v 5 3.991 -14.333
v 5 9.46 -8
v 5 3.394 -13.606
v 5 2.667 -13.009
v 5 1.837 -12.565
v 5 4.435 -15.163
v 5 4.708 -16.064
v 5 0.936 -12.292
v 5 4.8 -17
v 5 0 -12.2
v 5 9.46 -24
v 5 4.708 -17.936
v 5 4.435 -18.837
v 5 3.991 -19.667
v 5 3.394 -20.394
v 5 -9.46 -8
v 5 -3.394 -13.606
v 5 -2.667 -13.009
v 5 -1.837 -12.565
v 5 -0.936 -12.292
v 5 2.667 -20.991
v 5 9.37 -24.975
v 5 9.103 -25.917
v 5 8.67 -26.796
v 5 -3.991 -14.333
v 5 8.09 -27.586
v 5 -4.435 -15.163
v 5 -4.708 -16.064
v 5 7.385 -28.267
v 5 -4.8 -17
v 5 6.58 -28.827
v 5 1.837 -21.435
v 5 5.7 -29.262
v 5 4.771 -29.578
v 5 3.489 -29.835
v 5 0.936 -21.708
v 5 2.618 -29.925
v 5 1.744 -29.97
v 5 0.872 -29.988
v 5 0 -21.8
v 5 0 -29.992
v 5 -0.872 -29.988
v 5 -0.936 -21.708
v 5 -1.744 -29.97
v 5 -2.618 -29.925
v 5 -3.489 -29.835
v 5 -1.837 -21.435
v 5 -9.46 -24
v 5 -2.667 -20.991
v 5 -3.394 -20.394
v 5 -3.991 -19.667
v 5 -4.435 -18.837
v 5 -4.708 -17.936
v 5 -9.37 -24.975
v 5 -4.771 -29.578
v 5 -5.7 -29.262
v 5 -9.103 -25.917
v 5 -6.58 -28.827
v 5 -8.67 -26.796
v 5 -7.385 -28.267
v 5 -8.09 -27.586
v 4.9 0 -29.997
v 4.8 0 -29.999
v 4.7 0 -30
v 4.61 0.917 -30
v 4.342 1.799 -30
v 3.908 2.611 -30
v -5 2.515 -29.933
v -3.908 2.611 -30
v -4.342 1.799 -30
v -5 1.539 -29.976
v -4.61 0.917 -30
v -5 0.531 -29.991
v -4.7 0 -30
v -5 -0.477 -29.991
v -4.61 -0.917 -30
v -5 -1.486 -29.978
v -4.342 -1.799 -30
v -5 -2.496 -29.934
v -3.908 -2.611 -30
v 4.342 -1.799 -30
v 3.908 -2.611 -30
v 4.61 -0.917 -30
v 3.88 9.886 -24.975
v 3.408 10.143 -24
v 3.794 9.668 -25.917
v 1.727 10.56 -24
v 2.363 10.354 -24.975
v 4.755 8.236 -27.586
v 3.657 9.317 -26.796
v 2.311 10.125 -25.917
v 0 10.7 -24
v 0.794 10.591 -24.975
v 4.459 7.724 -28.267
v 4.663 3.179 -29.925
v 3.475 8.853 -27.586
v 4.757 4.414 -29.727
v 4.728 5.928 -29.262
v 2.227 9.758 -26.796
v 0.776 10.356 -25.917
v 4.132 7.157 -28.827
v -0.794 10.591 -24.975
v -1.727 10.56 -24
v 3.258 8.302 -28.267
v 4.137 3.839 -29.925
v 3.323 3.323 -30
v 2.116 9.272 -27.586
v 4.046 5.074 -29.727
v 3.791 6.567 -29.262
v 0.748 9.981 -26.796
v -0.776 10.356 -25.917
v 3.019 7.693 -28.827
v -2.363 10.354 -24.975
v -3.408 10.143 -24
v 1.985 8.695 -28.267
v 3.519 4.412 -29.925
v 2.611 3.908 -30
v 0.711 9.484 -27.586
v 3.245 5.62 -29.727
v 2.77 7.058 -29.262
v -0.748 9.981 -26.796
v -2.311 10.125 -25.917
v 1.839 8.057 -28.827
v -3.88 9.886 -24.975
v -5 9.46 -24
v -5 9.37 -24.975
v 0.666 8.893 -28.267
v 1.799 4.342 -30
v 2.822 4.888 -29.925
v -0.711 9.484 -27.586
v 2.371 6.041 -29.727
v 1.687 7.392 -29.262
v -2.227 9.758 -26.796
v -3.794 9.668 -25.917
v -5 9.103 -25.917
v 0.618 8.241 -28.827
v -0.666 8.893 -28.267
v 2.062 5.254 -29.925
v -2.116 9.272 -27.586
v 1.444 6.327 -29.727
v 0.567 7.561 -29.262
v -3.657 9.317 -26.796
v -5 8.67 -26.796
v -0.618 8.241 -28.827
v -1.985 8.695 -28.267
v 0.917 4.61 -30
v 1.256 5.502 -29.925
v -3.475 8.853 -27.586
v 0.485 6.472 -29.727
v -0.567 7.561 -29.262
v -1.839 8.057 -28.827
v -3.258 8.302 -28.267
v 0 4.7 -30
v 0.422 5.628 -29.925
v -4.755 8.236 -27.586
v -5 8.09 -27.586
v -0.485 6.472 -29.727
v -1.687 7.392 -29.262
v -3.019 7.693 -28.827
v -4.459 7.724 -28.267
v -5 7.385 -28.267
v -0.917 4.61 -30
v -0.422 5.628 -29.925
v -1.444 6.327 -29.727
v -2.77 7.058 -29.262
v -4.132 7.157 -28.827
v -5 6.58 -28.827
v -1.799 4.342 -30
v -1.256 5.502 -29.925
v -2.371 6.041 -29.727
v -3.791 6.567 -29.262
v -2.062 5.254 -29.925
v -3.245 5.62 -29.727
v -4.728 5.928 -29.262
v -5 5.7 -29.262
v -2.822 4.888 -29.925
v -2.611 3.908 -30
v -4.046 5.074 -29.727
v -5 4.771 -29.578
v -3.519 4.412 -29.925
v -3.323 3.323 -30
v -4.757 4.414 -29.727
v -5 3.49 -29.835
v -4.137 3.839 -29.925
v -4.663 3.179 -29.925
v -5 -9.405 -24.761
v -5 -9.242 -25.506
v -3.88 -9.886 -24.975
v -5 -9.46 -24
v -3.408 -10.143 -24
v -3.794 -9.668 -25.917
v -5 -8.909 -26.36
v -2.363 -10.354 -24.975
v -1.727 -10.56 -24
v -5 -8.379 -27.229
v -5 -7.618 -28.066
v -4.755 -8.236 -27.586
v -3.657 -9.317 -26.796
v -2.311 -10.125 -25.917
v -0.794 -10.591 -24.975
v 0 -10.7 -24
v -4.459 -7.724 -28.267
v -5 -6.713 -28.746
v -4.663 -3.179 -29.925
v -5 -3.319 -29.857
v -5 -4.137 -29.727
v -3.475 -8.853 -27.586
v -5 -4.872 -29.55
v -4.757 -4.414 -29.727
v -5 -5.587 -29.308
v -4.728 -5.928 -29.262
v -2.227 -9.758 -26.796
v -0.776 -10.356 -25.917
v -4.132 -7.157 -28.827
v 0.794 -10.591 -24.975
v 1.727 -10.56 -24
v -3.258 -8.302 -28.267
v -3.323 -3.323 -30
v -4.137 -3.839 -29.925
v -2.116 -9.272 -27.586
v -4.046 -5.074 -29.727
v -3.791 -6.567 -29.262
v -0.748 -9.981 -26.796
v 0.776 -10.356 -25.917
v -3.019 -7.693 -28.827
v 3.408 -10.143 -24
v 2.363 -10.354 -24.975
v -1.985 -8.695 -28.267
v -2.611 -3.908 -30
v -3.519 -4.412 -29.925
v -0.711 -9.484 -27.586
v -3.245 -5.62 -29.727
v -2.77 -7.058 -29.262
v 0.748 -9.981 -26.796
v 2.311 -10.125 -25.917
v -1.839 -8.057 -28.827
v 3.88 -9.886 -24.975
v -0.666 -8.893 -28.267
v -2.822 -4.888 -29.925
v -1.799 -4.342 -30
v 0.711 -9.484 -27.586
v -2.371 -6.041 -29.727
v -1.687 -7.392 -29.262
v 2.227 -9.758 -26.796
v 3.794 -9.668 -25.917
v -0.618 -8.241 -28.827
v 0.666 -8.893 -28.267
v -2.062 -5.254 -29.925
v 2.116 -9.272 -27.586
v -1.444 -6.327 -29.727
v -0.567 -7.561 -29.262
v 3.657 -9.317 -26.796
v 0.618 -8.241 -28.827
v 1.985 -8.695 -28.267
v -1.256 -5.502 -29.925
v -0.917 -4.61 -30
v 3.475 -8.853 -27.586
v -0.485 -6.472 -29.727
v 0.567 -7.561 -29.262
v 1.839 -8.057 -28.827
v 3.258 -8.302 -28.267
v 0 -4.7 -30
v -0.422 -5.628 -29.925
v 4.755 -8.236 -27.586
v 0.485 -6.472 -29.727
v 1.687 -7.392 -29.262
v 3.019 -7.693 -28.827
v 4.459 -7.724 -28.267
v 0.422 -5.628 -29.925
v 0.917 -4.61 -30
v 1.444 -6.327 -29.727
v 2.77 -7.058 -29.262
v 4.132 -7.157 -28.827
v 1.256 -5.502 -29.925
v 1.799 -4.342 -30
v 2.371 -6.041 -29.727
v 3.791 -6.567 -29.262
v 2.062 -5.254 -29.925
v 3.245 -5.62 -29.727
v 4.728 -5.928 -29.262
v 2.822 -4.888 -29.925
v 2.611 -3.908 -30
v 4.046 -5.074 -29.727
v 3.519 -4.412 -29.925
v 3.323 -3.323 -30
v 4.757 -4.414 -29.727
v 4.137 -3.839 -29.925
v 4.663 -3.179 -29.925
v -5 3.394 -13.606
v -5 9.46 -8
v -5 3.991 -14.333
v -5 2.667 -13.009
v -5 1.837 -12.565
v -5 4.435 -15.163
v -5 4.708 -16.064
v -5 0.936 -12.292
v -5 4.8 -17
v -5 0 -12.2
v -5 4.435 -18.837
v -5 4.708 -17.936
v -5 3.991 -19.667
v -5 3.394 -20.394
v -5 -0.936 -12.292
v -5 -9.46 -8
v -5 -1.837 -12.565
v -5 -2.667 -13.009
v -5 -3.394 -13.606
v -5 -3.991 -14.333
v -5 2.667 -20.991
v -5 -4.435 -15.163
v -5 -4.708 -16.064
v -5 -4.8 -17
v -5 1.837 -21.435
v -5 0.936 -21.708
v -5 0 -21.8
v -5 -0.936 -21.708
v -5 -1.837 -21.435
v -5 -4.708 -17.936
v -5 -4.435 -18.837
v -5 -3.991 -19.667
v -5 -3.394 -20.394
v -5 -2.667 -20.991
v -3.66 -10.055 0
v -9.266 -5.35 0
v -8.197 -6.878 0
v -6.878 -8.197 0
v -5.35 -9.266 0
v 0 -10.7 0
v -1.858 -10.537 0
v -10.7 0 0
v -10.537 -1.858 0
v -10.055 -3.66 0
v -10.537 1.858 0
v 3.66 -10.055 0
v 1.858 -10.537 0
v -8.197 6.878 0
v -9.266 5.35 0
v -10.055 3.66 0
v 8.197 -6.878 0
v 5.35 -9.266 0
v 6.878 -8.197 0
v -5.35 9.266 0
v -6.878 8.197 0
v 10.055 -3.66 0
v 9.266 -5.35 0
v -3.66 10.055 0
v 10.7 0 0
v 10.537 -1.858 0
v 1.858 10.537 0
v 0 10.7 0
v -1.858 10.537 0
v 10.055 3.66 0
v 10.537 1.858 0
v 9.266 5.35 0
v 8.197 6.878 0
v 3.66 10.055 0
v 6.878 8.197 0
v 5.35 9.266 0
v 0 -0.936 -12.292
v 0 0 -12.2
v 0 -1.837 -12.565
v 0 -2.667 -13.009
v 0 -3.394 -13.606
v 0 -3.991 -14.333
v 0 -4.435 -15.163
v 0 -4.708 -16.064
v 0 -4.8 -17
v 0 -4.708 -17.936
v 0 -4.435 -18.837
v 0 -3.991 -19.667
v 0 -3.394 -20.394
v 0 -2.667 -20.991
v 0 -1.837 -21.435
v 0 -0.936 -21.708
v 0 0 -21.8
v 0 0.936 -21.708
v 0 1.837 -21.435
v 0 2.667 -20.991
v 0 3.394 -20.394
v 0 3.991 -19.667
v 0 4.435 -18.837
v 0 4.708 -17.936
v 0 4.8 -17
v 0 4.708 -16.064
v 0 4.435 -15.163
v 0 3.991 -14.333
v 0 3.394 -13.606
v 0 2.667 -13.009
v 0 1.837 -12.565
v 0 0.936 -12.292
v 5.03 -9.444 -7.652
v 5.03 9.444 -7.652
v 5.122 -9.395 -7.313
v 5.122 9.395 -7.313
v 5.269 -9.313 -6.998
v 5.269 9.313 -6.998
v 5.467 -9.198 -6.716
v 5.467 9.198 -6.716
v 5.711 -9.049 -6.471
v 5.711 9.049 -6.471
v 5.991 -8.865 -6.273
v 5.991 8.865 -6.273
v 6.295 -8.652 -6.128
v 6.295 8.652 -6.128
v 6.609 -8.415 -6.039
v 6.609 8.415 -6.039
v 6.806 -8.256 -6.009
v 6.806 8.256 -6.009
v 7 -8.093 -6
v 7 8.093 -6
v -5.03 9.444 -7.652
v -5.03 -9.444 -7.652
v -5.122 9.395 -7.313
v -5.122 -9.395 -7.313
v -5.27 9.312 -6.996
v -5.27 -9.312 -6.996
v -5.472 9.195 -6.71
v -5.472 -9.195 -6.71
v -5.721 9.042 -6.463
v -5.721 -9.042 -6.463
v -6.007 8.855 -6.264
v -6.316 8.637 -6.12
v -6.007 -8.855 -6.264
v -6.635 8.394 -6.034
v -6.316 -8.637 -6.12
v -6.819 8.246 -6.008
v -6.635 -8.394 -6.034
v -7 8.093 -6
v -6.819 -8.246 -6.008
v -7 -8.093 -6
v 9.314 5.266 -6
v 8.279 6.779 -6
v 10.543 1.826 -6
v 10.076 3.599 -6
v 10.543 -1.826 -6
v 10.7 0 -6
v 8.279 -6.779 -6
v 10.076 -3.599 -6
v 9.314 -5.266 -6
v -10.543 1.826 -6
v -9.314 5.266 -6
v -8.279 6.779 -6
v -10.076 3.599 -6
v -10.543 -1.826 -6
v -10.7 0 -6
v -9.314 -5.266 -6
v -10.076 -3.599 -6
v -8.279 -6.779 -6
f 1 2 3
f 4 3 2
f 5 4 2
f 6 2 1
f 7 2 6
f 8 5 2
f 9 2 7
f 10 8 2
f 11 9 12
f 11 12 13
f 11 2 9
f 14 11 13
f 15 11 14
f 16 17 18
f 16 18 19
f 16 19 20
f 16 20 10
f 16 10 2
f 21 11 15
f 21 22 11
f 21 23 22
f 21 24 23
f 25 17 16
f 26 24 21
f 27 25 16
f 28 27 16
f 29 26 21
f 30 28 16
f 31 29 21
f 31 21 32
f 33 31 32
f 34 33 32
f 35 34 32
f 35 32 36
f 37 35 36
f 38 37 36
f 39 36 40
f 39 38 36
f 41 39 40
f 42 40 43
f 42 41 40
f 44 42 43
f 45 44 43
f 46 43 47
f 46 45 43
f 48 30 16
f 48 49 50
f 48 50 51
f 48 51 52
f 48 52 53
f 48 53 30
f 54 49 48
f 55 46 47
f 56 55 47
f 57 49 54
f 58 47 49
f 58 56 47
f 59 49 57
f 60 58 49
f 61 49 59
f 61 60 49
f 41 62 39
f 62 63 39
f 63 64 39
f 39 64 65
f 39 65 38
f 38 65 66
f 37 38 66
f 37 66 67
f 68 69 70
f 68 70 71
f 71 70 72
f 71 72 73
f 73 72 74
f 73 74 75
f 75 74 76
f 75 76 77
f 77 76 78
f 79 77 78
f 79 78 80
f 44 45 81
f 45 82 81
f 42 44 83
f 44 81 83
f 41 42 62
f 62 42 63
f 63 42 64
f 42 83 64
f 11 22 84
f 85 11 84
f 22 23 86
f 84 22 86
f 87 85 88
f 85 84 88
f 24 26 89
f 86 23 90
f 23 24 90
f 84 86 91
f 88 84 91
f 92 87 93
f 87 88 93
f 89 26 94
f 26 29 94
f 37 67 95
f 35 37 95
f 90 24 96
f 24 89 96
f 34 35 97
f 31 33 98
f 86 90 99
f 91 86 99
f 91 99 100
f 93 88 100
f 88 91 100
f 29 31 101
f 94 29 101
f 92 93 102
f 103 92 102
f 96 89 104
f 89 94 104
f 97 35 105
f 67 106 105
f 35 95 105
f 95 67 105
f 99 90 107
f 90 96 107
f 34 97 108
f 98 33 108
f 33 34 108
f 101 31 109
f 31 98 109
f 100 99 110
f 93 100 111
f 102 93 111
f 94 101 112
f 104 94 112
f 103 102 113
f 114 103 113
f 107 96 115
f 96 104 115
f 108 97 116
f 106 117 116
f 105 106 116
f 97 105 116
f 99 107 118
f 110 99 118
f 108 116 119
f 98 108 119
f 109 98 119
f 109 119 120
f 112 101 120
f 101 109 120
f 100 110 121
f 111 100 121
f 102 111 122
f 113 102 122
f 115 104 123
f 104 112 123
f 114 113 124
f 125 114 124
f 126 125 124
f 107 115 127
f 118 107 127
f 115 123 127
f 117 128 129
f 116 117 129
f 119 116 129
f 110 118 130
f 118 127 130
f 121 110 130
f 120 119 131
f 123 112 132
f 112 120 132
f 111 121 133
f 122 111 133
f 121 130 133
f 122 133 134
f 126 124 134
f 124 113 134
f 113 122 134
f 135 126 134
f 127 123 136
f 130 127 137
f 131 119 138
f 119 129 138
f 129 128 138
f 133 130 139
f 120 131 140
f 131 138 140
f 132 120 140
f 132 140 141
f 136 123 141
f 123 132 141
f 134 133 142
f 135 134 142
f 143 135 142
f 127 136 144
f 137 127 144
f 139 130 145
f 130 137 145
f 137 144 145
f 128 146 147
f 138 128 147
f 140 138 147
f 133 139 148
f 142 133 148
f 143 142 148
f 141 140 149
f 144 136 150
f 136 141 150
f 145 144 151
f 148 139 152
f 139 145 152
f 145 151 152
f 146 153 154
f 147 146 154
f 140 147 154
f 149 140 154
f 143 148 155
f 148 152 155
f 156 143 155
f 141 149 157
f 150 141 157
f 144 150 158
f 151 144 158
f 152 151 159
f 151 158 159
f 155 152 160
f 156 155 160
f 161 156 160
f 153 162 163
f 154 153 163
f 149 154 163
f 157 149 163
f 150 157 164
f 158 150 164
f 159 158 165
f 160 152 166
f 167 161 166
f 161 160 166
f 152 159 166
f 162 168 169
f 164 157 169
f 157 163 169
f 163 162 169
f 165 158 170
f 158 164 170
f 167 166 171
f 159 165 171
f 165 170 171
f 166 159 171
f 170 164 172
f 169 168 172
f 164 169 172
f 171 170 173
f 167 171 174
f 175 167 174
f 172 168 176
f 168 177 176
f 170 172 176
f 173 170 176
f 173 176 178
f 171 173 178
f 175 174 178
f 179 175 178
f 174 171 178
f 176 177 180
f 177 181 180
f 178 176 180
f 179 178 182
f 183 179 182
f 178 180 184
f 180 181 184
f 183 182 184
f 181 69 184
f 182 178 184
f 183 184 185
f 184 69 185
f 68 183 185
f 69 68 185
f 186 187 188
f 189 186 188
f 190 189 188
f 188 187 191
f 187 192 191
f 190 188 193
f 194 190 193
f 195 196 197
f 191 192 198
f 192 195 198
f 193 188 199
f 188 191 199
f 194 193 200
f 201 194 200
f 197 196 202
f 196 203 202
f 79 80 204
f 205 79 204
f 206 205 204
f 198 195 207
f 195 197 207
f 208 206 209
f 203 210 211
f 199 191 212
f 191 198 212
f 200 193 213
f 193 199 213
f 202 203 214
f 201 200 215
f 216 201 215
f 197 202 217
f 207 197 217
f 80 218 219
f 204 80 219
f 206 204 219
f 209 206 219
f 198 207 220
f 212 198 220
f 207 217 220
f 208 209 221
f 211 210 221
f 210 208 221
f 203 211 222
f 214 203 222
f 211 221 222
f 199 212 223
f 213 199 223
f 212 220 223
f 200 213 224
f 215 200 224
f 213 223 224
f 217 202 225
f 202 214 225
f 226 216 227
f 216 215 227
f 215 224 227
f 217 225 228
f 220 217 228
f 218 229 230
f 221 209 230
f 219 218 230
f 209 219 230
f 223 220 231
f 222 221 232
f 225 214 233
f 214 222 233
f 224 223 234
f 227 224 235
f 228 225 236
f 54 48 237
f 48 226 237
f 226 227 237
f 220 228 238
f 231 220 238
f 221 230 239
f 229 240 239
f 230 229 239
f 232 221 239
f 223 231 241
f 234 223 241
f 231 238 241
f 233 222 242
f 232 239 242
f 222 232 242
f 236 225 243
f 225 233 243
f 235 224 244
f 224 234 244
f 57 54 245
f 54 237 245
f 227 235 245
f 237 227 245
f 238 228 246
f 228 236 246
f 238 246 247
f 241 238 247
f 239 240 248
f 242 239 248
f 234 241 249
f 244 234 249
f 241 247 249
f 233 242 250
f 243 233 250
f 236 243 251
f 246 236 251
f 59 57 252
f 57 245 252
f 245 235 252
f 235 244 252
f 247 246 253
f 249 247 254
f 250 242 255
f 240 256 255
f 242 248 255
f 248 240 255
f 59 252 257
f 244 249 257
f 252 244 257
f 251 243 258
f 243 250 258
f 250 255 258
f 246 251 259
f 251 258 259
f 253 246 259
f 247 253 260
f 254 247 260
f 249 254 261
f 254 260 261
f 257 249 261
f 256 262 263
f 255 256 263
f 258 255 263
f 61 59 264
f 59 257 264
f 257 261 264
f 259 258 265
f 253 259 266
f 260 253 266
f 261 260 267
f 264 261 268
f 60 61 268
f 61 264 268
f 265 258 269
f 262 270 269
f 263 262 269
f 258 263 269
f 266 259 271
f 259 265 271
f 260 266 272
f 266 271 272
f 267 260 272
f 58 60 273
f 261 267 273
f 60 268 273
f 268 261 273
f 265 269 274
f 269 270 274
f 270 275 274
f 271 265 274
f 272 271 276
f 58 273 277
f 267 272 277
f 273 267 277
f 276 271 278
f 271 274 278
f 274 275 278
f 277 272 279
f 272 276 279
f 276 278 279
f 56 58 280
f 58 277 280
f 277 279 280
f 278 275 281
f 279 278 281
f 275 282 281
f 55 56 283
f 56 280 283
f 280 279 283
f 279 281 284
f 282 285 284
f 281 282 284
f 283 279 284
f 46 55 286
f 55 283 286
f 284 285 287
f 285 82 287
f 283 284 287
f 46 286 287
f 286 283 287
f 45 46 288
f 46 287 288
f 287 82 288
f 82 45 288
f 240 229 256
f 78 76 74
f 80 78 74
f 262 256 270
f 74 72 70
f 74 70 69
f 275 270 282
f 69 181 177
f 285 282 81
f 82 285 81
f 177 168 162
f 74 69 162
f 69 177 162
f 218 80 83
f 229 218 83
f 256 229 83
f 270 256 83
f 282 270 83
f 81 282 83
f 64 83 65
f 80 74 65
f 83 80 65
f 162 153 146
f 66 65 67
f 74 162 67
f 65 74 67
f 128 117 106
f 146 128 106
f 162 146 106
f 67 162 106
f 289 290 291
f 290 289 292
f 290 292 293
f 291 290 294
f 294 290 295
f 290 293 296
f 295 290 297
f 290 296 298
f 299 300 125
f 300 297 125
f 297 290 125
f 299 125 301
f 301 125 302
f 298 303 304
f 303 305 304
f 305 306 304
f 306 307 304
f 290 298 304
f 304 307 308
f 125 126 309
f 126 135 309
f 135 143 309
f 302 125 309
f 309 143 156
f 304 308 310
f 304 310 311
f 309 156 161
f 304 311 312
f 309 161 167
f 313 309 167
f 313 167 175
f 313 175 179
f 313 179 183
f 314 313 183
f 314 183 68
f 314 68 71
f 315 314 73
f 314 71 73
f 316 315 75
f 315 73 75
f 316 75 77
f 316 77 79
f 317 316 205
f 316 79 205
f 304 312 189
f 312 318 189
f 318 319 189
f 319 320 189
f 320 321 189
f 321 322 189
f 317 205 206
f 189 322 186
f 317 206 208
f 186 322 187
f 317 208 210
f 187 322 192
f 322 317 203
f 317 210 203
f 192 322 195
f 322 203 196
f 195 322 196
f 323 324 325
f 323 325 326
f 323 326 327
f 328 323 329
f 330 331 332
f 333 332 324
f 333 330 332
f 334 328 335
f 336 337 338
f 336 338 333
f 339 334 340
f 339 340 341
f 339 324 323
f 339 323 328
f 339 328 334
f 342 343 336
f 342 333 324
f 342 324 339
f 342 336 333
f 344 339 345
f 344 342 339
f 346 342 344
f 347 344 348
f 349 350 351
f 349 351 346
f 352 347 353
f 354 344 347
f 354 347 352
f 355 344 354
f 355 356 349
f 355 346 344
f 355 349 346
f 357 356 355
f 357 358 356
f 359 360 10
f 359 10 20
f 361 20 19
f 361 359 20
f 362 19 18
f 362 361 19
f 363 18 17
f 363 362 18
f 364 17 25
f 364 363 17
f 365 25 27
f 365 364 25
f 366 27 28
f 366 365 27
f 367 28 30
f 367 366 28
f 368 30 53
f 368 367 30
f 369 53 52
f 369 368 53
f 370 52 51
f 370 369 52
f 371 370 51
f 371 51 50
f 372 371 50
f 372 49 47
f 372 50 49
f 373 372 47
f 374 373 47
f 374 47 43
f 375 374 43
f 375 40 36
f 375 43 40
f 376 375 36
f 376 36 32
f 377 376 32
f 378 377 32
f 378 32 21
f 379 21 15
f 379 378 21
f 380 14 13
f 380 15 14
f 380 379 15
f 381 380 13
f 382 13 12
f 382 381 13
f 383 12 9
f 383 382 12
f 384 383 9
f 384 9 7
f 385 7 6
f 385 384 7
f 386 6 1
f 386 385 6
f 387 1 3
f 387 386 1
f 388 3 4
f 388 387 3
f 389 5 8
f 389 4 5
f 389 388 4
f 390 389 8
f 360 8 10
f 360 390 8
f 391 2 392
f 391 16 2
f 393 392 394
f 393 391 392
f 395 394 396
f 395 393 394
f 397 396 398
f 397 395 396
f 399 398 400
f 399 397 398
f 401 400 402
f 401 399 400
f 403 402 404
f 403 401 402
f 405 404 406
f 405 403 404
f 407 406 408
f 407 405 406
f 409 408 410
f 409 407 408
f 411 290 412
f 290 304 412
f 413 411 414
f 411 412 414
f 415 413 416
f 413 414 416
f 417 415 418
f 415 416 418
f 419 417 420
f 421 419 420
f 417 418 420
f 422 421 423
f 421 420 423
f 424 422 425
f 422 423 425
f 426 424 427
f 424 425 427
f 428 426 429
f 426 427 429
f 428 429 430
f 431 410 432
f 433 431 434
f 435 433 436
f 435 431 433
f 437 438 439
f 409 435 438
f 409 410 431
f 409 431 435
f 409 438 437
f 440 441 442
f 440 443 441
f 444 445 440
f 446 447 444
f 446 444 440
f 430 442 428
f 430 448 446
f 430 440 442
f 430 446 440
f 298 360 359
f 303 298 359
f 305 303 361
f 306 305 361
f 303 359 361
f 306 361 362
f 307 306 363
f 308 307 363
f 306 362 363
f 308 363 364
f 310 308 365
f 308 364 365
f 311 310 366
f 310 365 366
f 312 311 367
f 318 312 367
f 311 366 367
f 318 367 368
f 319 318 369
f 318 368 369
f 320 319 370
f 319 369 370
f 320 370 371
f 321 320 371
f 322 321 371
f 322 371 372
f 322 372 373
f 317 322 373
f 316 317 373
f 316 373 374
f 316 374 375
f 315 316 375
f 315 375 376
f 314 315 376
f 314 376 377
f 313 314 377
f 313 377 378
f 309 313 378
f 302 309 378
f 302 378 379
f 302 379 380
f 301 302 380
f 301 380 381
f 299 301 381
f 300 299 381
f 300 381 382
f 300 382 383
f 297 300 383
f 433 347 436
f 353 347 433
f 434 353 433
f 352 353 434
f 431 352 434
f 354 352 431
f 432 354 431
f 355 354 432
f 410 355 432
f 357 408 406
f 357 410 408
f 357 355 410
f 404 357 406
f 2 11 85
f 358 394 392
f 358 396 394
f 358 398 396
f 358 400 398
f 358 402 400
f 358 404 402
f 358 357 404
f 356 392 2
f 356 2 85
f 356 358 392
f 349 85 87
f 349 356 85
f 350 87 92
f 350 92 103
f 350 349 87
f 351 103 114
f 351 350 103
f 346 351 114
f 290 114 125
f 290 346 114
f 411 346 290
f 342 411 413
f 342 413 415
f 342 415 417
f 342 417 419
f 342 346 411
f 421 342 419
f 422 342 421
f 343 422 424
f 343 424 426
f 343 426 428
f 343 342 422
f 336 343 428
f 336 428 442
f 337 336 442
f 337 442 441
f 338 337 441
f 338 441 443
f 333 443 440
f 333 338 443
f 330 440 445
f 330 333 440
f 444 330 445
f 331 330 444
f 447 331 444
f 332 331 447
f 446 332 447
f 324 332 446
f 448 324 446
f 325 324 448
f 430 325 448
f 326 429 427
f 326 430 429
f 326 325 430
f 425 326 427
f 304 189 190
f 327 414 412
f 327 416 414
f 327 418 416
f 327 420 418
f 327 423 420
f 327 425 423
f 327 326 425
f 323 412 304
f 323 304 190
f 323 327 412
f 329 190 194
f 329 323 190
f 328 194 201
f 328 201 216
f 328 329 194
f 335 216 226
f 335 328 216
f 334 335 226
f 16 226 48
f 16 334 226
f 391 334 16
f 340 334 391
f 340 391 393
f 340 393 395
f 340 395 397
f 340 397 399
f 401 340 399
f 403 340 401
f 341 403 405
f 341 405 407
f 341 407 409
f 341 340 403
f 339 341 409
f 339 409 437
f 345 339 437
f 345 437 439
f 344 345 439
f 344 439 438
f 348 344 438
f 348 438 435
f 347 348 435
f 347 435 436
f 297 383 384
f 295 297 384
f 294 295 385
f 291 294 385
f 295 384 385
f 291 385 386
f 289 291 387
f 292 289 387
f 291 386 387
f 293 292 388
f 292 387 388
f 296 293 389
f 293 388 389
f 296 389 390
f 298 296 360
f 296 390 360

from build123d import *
from build123d import SkipClean  # not in build123d's __all__

# Parameters (mm, degrees)
F0_R     = 10.7
F1_DEPTH = 30
F2_R     = 6
F4_DEPTH = 10.701
F5_DEPTH = 10.7010001
F6_W     = 6.2500013784
F6_H     = 36.9480545221
F6_W_2   = 6.8020046502
F6_H_2   = 40.0000055429
F7_DEPTH = 24
F8_R     = 2


# Not quite as in the source:
# - after a boolean that leaves OpenCascade's solid faulty, fix() repairs it


with BuildPart() as f1:
    # F0 (on Top) → F1 (new body)
    with BuildSketch(Plane.XY):
        Circle(F0_R)
    extrude(amount=-F1_DEPTH)

    # F2
    f2_edges = [f1.edges().sort_by_distance(p)[0] for p in [
        (-10.7, 0, -30),
    ]]
    fillet(f2_edges, radius=F2_R)

    # F3 (on Right) → F4 (cut, through all)
    with BuildSketch(Plane.YZ):
        with BuildLine():
            ThreePointArc((0, -12.2), (-3.3941125497, -20.3941125497), (4.8, -17))
            ThreePointArc((4.8, -17), (3.3941125497, -13.6058874503), (0, -12.2))
        make_face()
    extrude(amount=-F4_DEPTH, mode=Mode.SUBTRACT)

    # F5 (cut, through all): a face of the model
    f5_faces = [f1.faces().sort_by_distance(p)[0] for p in [
        (0, 0, -17),
    ]]
    with SkipClean():  # cleaning this boolean's faces spoils the solid; the shape is the same uncleaned
        extrude(f5_faces, amount=-F5_DEPTH, mode=Mode.SUBTRACT)

    # F6 (on face) → F7 (cut)
    with BuildSketch(Plane(origin=(0, 0, -30), x_dir=(1, 0, 0), z_dir=(0, 0, -1))):
        with Locations((-8.1250006892, 1.5259755104)):
            Rectangle(F6_W, F6_H)
        with Locations((8.4010023251, 0)):
            Rectangle(F6_W_2, F6_H_2)
    extrude(amount=-F7_DEPTH, mode=Mode.SUBTRACT)

    add(f1.part.fix(), mode=Mode.REPLACE)

    # F8
    f8_edges = [f1.edges().sort_by_distance(p)[0] for p in [
        (-5, 0, -6),
        (5, 0, -6),
    ]]
    fillet(f8_edges, radius=F8_R)


solid = f1.part
